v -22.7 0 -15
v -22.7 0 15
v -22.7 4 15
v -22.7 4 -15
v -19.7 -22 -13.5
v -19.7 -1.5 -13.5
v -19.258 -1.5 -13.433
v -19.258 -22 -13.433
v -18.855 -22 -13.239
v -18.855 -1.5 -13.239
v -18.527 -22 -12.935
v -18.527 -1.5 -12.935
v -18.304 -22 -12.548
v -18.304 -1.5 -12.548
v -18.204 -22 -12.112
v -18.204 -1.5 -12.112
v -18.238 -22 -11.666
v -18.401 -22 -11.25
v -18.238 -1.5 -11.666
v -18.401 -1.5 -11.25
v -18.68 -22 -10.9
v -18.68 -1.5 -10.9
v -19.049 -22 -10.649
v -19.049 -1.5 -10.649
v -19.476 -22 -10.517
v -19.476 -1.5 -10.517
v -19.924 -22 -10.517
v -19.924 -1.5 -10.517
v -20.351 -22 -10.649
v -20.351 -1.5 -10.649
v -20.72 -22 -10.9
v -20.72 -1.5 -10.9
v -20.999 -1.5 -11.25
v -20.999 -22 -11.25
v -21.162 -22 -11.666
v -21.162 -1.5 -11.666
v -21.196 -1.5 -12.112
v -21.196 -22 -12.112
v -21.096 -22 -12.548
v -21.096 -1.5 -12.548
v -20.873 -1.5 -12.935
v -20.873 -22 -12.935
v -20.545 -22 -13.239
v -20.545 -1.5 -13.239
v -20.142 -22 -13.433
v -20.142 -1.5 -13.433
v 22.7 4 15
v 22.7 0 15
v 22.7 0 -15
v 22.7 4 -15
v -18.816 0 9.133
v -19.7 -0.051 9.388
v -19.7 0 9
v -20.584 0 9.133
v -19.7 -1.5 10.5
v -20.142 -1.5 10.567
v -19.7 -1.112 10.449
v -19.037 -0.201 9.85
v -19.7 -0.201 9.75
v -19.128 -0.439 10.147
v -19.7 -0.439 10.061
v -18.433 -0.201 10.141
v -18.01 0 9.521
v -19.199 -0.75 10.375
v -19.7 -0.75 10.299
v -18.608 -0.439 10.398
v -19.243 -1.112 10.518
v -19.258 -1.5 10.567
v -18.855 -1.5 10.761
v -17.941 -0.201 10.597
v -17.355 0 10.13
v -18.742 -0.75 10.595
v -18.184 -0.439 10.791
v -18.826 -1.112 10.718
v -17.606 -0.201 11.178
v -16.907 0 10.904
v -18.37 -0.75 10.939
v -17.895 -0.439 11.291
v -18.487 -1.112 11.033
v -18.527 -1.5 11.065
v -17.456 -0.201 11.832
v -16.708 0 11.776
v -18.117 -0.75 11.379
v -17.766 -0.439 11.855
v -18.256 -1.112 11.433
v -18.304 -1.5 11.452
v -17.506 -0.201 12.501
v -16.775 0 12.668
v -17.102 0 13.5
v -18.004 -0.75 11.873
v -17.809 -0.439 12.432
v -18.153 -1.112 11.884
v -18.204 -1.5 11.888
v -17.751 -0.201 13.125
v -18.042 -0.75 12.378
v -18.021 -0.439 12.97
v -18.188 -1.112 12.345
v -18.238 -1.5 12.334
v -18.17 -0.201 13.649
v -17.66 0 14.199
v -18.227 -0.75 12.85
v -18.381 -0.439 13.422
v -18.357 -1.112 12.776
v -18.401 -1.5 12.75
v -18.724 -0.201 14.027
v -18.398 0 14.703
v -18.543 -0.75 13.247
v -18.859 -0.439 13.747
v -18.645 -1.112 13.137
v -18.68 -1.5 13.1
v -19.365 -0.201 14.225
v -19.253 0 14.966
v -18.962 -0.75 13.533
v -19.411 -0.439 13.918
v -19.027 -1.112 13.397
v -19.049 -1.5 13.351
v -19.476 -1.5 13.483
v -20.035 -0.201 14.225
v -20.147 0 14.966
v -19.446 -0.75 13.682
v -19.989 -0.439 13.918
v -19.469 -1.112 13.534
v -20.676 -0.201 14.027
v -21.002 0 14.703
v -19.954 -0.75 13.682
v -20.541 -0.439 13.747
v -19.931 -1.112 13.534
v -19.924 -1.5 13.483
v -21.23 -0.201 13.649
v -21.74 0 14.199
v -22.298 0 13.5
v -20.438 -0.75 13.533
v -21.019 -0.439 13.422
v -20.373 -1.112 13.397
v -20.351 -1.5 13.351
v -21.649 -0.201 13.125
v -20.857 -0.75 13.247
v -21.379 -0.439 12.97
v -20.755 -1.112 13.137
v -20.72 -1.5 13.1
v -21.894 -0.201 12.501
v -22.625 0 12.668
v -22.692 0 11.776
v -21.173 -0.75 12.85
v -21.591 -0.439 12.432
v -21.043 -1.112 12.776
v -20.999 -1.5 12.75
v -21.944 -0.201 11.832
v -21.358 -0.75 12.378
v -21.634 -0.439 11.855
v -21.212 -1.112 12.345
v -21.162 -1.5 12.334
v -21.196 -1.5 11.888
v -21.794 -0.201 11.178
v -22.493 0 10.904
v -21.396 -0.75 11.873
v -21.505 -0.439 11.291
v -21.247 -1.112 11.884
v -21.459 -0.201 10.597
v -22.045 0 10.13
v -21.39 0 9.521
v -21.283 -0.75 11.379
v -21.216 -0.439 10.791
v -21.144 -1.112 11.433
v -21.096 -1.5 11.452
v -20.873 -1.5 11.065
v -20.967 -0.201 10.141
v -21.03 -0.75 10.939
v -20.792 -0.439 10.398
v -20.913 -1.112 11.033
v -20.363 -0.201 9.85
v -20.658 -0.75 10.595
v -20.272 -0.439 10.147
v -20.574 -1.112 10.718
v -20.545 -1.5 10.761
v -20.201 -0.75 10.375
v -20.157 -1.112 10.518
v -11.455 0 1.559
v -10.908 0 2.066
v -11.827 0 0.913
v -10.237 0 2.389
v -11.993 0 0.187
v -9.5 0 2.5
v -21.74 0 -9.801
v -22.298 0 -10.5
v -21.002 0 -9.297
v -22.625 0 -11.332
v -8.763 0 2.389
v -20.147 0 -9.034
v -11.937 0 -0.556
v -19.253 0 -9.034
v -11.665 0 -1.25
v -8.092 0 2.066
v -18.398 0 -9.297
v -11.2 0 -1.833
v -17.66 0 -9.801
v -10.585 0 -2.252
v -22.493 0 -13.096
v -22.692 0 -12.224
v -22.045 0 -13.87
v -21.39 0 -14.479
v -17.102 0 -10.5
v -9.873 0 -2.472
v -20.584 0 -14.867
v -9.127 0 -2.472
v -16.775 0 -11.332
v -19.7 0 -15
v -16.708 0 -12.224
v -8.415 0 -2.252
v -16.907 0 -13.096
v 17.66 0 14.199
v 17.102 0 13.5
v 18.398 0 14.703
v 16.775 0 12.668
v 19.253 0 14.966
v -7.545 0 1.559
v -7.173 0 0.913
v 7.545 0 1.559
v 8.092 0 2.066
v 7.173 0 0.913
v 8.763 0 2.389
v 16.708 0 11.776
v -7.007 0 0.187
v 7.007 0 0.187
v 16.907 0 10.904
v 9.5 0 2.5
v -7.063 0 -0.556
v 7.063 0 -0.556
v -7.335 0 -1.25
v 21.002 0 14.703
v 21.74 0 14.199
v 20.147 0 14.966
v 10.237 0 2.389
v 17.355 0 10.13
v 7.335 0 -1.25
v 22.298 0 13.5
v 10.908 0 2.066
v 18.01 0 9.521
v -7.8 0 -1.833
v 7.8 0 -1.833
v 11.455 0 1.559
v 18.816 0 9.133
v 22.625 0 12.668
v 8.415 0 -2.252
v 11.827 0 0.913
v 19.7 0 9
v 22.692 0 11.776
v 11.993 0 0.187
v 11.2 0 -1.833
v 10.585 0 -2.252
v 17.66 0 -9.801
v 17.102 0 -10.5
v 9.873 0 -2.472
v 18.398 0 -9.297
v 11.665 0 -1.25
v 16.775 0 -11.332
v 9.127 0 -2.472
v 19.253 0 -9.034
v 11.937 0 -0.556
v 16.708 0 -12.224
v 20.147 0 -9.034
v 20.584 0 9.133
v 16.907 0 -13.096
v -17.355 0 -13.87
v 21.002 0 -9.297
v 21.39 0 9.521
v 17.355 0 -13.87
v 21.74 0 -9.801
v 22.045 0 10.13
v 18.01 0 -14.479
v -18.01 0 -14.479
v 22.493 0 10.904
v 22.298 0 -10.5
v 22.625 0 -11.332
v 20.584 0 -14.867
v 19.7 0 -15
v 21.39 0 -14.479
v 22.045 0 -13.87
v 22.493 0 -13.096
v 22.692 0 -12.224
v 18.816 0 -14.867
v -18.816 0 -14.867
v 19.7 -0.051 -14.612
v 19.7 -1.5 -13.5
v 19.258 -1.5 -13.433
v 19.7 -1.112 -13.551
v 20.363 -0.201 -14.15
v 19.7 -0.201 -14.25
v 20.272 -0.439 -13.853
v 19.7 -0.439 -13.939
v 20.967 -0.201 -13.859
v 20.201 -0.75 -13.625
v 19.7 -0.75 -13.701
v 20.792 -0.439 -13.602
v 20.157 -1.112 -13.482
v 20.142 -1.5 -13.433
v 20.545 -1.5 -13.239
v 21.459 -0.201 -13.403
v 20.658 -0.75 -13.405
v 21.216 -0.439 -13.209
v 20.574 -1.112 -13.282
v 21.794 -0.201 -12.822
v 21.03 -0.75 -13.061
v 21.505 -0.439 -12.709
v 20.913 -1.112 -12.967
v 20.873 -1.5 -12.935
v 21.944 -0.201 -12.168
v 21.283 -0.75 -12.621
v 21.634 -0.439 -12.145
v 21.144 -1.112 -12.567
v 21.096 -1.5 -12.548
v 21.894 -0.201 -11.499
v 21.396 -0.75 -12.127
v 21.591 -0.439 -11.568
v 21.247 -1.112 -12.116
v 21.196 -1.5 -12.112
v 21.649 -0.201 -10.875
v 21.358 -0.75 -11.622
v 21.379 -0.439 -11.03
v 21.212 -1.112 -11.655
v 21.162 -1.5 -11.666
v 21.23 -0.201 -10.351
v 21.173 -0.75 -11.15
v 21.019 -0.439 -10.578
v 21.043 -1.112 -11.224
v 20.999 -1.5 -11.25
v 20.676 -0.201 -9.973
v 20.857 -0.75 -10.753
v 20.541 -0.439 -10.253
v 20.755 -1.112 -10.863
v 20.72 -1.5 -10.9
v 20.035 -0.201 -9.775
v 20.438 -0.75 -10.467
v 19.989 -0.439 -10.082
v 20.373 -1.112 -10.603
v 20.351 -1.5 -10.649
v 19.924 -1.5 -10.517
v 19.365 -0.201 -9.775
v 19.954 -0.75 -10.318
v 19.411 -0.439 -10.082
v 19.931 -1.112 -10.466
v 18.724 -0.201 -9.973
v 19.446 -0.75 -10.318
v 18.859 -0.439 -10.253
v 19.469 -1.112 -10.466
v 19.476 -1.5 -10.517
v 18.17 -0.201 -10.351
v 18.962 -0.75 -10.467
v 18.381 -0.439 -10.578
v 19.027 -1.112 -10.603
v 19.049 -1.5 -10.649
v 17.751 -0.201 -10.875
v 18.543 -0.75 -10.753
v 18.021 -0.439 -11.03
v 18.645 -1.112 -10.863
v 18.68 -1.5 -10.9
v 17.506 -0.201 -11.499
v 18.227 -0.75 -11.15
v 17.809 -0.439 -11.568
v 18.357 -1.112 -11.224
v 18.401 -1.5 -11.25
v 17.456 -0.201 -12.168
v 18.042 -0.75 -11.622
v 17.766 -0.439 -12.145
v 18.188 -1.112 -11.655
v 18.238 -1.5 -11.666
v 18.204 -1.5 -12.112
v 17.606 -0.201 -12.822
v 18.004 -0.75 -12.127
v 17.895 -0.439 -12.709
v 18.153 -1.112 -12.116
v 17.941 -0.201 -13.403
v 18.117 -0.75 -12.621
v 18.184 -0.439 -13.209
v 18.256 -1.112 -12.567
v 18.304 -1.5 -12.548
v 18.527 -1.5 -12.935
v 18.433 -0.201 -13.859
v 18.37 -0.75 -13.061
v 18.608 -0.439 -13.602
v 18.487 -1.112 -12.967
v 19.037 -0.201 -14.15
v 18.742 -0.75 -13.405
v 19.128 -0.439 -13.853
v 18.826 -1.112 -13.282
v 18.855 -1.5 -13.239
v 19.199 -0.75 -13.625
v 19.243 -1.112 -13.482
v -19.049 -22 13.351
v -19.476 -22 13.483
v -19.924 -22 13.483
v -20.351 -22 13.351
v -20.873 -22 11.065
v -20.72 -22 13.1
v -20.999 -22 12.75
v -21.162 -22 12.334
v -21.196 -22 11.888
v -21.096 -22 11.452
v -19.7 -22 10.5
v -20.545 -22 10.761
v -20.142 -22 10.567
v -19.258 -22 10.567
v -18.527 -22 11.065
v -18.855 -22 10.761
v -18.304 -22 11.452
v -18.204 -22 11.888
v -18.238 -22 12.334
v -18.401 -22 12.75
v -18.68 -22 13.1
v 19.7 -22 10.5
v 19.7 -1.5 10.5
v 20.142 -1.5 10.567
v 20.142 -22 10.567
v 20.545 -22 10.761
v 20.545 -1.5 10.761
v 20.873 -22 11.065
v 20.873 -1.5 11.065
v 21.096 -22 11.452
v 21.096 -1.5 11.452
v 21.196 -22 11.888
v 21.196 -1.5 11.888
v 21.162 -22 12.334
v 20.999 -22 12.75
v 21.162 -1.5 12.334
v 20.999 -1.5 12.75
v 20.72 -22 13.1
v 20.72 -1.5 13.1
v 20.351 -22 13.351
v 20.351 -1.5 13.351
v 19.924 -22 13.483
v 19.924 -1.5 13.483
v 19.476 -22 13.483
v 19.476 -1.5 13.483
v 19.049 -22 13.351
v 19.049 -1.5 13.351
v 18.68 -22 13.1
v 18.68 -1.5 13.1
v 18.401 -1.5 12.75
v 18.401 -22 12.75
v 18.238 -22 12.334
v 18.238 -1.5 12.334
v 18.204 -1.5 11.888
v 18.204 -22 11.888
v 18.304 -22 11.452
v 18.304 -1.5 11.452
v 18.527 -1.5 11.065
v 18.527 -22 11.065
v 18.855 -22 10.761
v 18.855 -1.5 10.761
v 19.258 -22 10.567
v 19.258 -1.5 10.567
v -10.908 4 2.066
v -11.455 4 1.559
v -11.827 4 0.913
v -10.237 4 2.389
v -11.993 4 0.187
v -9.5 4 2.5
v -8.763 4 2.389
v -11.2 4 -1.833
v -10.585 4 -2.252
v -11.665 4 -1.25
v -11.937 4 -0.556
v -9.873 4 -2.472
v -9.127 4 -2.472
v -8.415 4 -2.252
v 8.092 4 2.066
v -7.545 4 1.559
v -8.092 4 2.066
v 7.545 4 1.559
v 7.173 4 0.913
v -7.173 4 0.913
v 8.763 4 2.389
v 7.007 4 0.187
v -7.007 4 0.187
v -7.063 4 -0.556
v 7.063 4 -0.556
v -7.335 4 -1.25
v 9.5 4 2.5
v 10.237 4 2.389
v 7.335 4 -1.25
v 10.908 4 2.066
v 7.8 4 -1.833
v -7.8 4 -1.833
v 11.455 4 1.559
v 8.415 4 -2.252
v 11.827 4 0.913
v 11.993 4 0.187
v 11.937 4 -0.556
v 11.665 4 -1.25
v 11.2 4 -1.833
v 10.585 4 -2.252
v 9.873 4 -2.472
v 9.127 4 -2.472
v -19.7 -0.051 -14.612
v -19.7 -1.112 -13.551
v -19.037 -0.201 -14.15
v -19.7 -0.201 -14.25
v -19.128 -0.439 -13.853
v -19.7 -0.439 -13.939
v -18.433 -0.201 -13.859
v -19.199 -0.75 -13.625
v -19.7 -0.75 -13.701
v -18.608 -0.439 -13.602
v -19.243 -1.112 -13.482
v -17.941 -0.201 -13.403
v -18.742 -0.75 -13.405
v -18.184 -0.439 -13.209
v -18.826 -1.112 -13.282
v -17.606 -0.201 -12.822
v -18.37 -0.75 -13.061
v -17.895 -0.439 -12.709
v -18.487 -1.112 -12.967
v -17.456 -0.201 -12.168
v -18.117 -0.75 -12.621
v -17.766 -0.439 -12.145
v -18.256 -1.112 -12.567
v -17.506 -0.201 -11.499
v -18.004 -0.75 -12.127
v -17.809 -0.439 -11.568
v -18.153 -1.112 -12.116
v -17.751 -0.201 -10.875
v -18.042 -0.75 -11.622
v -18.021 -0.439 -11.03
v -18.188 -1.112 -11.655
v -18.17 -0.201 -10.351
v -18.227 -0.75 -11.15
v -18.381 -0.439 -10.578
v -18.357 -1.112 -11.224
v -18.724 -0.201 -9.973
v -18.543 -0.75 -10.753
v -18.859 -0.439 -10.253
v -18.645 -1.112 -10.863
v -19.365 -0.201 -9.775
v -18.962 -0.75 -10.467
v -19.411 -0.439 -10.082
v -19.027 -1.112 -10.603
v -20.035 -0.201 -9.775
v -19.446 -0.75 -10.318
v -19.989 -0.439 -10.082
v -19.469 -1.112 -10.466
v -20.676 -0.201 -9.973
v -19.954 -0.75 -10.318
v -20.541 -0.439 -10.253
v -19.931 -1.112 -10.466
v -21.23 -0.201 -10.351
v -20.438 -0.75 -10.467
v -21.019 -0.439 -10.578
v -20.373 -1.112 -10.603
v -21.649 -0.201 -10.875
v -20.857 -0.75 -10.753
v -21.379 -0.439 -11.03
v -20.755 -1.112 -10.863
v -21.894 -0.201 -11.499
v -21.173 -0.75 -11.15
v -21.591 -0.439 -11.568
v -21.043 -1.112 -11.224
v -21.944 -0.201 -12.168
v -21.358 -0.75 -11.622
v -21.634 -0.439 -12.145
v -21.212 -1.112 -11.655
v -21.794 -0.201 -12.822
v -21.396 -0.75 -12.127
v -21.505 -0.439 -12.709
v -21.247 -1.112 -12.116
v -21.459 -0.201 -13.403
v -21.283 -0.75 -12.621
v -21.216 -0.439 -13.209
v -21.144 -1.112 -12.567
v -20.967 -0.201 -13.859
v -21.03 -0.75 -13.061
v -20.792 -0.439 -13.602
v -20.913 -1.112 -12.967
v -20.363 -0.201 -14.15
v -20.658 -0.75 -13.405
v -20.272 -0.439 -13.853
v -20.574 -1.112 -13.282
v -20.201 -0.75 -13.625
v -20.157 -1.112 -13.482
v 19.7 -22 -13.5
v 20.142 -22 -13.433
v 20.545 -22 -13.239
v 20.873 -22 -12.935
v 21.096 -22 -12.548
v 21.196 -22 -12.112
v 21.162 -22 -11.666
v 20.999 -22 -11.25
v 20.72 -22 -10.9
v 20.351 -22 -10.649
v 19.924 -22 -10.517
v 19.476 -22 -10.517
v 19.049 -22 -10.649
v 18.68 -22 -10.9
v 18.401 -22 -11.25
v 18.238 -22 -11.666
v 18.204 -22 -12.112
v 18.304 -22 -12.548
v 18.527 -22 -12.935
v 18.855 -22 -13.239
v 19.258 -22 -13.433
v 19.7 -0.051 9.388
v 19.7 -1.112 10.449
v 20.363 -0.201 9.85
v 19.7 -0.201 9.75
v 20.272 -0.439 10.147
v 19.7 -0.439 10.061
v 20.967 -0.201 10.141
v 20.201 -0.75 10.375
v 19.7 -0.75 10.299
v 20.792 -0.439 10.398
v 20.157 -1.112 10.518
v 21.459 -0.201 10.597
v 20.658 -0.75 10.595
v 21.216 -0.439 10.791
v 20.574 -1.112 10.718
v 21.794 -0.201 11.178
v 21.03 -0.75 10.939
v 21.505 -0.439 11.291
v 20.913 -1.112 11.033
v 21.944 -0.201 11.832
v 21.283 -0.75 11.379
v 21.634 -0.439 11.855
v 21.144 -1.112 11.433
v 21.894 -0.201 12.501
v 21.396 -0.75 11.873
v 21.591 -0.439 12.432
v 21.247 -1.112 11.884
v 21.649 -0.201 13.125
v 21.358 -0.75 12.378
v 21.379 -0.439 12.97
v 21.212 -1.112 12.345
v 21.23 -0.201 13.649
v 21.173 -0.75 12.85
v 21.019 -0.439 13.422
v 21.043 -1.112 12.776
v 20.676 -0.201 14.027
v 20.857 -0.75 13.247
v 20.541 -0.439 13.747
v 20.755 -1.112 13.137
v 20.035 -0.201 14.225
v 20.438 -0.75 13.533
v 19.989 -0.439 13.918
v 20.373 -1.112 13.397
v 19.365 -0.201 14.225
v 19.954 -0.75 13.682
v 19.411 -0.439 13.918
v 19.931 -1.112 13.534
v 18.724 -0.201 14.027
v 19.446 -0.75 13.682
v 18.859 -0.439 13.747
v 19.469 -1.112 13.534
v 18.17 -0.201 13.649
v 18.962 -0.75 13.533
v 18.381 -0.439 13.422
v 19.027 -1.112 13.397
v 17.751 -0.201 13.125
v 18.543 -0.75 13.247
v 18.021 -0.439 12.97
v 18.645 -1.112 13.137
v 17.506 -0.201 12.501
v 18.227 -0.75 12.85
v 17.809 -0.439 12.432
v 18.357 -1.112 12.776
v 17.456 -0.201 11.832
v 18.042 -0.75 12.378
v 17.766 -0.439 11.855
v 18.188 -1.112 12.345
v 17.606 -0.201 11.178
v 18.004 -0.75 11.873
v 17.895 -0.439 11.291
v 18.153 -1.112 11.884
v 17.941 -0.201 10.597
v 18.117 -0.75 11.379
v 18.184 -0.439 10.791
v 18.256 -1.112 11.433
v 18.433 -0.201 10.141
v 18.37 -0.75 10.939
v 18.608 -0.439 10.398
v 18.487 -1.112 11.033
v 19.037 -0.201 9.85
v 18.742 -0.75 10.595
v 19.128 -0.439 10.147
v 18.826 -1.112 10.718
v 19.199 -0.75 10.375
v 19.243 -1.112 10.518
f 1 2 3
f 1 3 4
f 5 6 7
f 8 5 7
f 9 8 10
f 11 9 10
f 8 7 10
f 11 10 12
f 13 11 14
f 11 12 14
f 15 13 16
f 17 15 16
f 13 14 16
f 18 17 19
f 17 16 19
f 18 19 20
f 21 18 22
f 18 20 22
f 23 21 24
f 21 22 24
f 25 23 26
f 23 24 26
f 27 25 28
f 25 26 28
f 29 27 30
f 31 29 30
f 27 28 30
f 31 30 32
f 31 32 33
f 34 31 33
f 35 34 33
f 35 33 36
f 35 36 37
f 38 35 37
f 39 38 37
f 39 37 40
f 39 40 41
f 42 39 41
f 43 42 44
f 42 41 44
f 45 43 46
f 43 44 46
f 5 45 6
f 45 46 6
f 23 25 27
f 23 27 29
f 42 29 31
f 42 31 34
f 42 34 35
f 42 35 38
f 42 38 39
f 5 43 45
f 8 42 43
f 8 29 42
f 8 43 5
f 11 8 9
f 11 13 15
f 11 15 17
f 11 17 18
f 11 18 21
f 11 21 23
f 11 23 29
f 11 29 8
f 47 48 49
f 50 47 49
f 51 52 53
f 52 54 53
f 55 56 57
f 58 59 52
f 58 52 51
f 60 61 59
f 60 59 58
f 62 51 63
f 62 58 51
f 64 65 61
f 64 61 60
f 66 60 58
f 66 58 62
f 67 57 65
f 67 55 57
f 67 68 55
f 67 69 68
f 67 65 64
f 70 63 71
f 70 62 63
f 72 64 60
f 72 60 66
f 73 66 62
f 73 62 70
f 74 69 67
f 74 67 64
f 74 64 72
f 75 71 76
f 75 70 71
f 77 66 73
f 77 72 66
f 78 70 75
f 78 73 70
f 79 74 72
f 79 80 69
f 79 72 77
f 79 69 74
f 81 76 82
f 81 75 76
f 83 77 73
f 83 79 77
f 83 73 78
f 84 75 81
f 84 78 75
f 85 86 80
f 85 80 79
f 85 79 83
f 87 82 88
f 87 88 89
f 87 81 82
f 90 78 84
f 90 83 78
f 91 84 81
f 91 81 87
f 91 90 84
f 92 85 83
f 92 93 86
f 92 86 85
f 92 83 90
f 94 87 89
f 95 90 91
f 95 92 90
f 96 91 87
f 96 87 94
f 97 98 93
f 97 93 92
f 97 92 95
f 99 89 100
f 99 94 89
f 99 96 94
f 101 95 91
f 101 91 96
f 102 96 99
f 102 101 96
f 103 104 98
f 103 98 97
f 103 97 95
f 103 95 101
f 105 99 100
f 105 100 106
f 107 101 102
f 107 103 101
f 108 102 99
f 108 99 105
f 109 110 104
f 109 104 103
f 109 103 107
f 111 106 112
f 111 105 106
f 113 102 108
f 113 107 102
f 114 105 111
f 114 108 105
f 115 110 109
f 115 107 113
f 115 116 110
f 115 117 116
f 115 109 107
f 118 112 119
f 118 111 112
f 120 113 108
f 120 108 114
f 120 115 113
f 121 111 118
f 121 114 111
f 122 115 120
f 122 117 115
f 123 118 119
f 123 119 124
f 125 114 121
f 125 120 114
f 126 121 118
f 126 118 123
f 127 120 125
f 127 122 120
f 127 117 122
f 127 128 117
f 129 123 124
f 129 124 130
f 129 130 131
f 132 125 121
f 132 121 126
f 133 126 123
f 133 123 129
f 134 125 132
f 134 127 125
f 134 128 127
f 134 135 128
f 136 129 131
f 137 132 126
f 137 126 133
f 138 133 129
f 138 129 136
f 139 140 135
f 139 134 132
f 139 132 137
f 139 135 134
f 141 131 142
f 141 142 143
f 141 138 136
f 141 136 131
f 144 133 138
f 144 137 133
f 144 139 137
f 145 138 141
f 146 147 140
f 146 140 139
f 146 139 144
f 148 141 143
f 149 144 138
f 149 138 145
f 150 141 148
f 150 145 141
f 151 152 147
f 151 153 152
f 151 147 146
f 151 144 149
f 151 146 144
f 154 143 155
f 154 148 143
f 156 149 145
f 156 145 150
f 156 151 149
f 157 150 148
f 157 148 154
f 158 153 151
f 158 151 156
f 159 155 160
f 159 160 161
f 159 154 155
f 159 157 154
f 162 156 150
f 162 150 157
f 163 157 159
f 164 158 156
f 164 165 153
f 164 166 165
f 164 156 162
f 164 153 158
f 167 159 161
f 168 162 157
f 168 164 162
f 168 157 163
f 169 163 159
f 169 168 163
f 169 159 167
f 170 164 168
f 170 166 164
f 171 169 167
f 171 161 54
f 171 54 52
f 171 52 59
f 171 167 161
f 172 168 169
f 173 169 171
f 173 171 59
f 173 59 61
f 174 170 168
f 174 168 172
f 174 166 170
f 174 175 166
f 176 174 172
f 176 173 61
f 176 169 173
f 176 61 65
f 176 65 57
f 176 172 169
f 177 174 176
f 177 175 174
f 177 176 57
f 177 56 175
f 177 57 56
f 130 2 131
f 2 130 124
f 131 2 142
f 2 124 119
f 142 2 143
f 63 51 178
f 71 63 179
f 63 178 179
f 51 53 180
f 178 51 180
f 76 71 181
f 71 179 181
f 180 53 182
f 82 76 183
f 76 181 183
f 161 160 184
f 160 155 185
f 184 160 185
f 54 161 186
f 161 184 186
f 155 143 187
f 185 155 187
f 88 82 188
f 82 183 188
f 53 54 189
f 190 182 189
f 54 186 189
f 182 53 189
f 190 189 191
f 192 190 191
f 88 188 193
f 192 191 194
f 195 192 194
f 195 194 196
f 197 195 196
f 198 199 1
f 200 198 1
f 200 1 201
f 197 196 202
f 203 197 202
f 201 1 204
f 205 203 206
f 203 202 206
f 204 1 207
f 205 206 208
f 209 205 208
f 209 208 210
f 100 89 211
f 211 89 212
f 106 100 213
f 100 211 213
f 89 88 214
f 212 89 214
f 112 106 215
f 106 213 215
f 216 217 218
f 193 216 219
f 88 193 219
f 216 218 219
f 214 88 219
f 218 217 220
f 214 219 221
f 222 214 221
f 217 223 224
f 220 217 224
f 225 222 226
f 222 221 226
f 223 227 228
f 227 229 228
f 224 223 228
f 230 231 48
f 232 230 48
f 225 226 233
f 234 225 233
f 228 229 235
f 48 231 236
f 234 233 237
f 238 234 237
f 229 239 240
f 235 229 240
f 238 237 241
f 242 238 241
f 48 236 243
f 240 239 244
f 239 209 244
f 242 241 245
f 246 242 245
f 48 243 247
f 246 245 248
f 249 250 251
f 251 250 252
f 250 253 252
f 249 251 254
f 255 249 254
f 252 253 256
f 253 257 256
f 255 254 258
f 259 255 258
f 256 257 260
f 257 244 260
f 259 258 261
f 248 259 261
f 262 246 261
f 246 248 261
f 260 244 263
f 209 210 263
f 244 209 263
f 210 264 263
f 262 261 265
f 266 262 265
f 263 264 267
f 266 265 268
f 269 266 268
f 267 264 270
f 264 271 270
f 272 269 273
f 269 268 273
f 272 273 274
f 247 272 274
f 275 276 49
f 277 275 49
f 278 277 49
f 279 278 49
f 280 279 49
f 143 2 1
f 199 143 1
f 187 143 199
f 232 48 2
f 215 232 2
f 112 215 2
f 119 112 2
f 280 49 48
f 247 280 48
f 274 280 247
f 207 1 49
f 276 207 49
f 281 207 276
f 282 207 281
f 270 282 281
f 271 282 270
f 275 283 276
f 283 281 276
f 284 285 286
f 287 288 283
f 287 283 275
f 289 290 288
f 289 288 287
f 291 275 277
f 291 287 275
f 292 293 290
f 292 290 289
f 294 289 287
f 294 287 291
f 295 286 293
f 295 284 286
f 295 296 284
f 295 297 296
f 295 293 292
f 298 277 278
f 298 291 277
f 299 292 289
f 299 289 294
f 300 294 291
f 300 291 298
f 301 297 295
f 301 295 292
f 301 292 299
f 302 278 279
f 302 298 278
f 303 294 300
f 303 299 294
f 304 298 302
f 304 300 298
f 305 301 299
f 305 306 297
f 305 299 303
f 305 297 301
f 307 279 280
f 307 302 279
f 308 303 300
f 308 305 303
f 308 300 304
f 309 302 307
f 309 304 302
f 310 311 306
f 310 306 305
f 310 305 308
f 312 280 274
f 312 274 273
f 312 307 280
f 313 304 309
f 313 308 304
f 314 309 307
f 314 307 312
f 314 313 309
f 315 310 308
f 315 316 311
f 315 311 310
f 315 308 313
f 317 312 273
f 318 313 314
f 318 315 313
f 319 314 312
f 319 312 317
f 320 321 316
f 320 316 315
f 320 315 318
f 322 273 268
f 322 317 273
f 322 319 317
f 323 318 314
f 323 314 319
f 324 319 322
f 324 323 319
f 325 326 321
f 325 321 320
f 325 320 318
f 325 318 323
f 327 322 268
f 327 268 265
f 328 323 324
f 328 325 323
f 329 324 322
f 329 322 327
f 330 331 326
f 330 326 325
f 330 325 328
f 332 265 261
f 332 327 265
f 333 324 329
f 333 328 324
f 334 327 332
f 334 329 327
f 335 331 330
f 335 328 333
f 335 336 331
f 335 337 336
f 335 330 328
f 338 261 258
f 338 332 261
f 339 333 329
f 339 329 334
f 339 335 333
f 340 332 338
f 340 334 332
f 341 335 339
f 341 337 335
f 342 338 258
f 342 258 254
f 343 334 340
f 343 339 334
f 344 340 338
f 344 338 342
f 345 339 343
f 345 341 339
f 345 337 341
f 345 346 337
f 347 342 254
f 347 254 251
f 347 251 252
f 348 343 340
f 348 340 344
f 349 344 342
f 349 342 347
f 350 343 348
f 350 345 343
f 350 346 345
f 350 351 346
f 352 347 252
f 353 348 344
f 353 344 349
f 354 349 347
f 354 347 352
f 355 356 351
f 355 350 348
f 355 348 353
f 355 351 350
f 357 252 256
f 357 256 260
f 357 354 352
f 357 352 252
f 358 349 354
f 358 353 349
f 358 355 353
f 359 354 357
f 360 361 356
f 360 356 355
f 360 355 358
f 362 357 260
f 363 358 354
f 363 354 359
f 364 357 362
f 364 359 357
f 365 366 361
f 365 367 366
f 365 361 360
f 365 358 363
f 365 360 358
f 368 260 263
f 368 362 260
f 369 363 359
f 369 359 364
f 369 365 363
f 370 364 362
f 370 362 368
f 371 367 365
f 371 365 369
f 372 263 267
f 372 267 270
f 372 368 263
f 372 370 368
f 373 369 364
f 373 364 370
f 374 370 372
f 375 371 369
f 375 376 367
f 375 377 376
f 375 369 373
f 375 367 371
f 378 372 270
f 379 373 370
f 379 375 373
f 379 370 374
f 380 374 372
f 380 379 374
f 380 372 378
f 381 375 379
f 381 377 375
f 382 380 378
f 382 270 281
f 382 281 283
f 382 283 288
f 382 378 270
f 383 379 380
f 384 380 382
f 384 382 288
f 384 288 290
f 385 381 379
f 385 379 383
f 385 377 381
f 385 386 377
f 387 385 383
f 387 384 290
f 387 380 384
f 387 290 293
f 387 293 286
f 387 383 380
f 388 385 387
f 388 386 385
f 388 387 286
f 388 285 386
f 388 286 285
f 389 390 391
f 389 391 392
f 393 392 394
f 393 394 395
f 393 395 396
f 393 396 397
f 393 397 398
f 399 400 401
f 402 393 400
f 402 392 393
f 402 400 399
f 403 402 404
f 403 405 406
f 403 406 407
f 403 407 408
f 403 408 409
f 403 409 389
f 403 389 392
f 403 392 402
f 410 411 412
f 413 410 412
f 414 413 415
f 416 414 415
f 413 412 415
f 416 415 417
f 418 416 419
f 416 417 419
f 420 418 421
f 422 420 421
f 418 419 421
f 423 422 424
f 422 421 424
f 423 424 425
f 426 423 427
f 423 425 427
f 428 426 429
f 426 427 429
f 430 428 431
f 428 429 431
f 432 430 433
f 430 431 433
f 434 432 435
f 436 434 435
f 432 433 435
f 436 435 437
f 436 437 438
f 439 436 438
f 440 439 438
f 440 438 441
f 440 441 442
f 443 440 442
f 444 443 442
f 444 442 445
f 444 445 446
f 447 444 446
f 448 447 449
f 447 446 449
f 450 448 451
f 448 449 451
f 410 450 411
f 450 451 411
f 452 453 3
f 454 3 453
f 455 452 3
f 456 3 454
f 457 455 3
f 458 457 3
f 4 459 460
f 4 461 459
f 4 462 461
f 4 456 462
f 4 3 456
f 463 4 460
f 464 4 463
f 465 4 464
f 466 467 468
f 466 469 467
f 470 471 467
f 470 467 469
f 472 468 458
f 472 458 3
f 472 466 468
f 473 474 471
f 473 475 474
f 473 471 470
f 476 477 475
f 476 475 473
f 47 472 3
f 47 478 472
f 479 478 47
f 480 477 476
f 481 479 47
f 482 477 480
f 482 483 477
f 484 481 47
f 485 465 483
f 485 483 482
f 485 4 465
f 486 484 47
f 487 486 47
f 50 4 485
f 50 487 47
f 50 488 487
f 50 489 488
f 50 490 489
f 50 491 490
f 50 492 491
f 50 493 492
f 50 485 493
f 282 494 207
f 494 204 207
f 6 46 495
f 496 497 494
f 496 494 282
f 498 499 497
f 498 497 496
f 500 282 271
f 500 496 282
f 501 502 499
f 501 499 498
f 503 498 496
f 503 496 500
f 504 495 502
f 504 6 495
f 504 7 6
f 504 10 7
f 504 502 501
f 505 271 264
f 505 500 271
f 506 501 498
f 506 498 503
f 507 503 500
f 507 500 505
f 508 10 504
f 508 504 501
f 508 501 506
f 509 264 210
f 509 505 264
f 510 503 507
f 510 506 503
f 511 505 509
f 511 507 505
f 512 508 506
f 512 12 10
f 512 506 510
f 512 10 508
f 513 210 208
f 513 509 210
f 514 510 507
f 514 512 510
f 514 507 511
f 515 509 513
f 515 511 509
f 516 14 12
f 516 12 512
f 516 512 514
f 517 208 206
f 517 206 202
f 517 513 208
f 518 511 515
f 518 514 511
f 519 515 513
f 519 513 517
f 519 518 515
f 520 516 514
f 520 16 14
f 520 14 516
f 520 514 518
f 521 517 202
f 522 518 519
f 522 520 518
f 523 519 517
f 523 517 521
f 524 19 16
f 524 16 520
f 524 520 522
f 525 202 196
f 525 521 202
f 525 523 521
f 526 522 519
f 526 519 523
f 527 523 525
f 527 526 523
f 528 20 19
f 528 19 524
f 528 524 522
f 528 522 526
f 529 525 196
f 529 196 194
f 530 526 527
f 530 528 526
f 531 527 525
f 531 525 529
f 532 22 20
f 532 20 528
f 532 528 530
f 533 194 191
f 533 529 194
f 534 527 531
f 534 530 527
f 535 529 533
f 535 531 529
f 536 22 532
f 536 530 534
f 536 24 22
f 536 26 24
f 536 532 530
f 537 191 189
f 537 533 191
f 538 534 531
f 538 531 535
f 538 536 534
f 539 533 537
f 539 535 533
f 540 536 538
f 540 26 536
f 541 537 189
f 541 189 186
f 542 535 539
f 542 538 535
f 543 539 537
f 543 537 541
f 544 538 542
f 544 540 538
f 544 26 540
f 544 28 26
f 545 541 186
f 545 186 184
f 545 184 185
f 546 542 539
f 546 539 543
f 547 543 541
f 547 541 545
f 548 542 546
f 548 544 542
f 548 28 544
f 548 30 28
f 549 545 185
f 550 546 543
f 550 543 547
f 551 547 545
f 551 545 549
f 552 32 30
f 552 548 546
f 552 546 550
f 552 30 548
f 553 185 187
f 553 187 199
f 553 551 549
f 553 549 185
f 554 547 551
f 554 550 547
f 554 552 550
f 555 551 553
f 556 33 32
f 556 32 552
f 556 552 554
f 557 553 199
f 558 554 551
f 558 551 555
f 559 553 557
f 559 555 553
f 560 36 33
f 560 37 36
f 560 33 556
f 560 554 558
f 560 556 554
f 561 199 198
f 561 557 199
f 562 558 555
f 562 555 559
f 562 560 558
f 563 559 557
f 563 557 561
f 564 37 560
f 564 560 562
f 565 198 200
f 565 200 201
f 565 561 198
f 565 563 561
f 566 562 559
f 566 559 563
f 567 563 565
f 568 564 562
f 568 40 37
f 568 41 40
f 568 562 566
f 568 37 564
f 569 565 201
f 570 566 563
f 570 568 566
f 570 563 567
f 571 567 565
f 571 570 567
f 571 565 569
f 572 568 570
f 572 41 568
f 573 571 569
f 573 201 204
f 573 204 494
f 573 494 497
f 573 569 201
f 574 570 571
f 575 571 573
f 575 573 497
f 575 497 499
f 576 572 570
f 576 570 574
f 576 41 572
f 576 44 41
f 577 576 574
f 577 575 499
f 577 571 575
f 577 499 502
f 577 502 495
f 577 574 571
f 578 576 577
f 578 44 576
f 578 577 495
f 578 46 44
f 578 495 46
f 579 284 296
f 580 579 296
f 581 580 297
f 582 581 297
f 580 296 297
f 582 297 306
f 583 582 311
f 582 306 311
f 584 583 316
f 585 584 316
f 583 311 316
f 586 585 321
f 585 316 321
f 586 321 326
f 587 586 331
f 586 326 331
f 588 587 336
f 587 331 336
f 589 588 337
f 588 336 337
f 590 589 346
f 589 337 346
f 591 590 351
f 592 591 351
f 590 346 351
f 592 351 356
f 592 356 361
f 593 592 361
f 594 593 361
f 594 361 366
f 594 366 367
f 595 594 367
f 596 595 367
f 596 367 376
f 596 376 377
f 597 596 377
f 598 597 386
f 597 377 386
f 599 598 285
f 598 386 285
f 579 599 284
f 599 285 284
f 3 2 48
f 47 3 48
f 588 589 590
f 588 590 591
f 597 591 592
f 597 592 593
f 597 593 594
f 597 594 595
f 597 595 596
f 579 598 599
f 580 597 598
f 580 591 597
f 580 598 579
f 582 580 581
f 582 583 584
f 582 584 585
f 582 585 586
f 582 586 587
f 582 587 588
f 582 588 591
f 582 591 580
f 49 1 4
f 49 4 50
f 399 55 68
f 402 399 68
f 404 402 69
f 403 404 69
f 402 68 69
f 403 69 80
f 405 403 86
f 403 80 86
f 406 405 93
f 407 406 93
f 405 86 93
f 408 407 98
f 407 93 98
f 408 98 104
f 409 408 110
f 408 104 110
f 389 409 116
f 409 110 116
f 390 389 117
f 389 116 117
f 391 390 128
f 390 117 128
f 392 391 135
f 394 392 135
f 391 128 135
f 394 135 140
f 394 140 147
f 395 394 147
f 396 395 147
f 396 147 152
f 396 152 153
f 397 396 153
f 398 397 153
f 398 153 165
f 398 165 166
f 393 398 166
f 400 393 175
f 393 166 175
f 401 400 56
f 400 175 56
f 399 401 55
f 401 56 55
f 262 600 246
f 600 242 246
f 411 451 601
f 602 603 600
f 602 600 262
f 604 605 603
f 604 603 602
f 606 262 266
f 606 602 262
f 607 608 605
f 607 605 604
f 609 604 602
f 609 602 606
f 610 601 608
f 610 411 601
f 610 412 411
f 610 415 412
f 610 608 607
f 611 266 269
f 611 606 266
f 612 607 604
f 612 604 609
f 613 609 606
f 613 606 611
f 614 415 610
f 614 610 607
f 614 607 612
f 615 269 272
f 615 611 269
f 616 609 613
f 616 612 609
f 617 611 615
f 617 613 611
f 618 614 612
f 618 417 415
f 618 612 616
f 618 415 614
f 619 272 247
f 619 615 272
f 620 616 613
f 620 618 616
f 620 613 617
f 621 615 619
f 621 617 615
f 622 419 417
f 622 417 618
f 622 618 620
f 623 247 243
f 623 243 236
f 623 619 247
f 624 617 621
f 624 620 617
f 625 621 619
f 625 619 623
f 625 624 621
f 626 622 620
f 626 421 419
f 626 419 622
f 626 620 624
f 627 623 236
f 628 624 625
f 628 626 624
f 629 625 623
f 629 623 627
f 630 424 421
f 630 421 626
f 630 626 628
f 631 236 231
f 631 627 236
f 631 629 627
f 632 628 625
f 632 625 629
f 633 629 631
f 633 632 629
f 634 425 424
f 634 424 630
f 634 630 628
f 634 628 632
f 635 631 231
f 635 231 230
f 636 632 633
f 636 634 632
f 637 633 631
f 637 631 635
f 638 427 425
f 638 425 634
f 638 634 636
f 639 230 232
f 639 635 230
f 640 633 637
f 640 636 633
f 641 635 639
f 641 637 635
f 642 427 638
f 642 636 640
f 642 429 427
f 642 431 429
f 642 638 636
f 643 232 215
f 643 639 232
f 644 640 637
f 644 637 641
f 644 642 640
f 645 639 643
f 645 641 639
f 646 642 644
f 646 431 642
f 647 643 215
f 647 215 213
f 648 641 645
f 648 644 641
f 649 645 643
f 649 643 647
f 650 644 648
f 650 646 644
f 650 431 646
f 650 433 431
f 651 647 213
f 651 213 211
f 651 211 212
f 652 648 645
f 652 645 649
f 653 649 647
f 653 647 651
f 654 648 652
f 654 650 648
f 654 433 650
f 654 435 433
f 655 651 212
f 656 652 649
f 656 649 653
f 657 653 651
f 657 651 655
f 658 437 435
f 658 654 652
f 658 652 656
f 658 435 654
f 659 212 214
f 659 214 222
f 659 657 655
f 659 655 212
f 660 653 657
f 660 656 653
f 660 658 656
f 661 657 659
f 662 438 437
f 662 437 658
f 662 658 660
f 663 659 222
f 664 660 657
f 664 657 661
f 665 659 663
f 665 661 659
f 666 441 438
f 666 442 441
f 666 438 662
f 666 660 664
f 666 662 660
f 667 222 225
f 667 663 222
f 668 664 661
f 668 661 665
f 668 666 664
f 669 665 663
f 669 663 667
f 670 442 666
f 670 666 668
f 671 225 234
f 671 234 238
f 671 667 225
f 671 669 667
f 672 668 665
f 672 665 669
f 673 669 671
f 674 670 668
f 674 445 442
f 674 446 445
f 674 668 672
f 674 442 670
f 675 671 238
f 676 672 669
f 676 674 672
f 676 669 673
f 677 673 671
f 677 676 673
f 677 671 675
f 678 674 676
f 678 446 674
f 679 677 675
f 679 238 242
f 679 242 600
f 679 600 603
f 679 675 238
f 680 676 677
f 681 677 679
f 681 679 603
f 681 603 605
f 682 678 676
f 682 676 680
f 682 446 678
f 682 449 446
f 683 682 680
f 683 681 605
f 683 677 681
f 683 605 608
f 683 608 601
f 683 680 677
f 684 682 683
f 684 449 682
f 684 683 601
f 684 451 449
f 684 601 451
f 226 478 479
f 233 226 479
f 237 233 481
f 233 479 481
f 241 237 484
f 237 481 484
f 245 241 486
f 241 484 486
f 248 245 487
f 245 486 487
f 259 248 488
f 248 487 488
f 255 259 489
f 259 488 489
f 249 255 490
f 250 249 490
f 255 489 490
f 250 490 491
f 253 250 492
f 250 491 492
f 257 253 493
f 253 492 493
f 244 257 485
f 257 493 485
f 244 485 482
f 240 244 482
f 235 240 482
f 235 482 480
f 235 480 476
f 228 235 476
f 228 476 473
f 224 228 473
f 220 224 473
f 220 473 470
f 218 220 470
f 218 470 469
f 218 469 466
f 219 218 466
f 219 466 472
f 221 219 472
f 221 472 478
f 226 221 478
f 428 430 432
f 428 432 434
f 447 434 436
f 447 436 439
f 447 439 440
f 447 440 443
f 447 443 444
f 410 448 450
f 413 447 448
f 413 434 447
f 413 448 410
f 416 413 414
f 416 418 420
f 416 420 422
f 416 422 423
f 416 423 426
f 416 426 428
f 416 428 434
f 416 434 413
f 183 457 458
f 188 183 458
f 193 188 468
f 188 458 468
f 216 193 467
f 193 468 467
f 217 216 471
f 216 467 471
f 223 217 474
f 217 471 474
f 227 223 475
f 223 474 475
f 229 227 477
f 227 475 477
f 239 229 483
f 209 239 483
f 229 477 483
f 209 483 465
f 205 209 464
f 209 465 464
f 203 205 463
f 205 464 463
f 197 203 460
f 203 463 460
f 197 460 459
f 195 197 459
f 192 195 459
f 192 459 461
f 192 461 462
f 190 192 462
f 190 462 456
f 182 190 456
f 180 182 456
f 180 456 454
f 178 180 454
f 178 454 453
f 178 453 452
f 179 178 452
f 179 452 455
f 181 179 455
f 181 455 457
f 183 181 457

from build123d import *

# Parameters (mm, degrees)
SKETCH1_W           = 45.4
SKETCH1_H           = 30
BOSS_EXTRUDE1_DEPTH = 4
SKETCH2_R           = 2.5
CUT_EXTRUDE1_DEPTH  = 28.500727263
SKETCH3_R           = 1.5
BOSS_EXTRUDE2_DEPTH = 22
FILLET1_R           = 1.5


with BuildPart() as part:
    # Sketch1 → Boss-Extrude1 (new body)
    with BuildSketch(Plane(origin=(0, 0, 0), x_dir=(1, 0, 0), z_dir=(0, 1, 0))):
        Rectangle(SKETCH1_W, SKETCH1_H)
    extrude(amount=BOSS_EXTRUDE1_DEPTH)

    # Sketch2 → Cut-Extrude1 (cut, through all)
    with BuildSketch(Plane(origin=(0, 4, 0), x_dir=(1, 0, 0), z_dir=(0, 1, 0))):
        with Locations(Location((-9.5, 0, 0), (0, 0, 270))):
            Circle(SKETCH2_R)
        with Locations(Location((9.5, 0, 0), (0, 0, 270))):
            Circle(SKETCH2_R)
    extrude(amount=-CUT_EXTRUDE1_DEPTH, mode=Mode.SUBTRACT)

    # Sketch3 → Boss-Extrude2 (add)
    with BuildSketch(Plane.XZ):
        with Locations(Location((-19.7, 12, 0), (0, 0, 270))):
            Circle(SKETCH3_R)
        with Locations(Location((19.7, 12, 0), (0, 0, 270))):
            Circle(SKETCH3_R)
        with Locations(Location((-19.7, -12, 0), (0, 0, 270))):
            Circle(SKETCH3_R)
        with Locations(Location((19.7, -12, 0), (0, 0, 270))):
            Circle(SKETCH3_R)
    extrude(amount=BOSS_EXTRUDE2_DEPTH)

    # Fillet1
    fillet1_edges = [part.edges().sort_by_distance(p)[0] for p in [
        (-19.7, 0, 13.5),
        (19.7, 0, 13.5),
        (-19.7, 0, -10.5),
        (19.7, 0, -10.5),
    ]]
    fillet(fillet1_edges, radius=FILLET1_R - 0.0001)  # a hair under: the kernel refuses the full size


solid = part.part
